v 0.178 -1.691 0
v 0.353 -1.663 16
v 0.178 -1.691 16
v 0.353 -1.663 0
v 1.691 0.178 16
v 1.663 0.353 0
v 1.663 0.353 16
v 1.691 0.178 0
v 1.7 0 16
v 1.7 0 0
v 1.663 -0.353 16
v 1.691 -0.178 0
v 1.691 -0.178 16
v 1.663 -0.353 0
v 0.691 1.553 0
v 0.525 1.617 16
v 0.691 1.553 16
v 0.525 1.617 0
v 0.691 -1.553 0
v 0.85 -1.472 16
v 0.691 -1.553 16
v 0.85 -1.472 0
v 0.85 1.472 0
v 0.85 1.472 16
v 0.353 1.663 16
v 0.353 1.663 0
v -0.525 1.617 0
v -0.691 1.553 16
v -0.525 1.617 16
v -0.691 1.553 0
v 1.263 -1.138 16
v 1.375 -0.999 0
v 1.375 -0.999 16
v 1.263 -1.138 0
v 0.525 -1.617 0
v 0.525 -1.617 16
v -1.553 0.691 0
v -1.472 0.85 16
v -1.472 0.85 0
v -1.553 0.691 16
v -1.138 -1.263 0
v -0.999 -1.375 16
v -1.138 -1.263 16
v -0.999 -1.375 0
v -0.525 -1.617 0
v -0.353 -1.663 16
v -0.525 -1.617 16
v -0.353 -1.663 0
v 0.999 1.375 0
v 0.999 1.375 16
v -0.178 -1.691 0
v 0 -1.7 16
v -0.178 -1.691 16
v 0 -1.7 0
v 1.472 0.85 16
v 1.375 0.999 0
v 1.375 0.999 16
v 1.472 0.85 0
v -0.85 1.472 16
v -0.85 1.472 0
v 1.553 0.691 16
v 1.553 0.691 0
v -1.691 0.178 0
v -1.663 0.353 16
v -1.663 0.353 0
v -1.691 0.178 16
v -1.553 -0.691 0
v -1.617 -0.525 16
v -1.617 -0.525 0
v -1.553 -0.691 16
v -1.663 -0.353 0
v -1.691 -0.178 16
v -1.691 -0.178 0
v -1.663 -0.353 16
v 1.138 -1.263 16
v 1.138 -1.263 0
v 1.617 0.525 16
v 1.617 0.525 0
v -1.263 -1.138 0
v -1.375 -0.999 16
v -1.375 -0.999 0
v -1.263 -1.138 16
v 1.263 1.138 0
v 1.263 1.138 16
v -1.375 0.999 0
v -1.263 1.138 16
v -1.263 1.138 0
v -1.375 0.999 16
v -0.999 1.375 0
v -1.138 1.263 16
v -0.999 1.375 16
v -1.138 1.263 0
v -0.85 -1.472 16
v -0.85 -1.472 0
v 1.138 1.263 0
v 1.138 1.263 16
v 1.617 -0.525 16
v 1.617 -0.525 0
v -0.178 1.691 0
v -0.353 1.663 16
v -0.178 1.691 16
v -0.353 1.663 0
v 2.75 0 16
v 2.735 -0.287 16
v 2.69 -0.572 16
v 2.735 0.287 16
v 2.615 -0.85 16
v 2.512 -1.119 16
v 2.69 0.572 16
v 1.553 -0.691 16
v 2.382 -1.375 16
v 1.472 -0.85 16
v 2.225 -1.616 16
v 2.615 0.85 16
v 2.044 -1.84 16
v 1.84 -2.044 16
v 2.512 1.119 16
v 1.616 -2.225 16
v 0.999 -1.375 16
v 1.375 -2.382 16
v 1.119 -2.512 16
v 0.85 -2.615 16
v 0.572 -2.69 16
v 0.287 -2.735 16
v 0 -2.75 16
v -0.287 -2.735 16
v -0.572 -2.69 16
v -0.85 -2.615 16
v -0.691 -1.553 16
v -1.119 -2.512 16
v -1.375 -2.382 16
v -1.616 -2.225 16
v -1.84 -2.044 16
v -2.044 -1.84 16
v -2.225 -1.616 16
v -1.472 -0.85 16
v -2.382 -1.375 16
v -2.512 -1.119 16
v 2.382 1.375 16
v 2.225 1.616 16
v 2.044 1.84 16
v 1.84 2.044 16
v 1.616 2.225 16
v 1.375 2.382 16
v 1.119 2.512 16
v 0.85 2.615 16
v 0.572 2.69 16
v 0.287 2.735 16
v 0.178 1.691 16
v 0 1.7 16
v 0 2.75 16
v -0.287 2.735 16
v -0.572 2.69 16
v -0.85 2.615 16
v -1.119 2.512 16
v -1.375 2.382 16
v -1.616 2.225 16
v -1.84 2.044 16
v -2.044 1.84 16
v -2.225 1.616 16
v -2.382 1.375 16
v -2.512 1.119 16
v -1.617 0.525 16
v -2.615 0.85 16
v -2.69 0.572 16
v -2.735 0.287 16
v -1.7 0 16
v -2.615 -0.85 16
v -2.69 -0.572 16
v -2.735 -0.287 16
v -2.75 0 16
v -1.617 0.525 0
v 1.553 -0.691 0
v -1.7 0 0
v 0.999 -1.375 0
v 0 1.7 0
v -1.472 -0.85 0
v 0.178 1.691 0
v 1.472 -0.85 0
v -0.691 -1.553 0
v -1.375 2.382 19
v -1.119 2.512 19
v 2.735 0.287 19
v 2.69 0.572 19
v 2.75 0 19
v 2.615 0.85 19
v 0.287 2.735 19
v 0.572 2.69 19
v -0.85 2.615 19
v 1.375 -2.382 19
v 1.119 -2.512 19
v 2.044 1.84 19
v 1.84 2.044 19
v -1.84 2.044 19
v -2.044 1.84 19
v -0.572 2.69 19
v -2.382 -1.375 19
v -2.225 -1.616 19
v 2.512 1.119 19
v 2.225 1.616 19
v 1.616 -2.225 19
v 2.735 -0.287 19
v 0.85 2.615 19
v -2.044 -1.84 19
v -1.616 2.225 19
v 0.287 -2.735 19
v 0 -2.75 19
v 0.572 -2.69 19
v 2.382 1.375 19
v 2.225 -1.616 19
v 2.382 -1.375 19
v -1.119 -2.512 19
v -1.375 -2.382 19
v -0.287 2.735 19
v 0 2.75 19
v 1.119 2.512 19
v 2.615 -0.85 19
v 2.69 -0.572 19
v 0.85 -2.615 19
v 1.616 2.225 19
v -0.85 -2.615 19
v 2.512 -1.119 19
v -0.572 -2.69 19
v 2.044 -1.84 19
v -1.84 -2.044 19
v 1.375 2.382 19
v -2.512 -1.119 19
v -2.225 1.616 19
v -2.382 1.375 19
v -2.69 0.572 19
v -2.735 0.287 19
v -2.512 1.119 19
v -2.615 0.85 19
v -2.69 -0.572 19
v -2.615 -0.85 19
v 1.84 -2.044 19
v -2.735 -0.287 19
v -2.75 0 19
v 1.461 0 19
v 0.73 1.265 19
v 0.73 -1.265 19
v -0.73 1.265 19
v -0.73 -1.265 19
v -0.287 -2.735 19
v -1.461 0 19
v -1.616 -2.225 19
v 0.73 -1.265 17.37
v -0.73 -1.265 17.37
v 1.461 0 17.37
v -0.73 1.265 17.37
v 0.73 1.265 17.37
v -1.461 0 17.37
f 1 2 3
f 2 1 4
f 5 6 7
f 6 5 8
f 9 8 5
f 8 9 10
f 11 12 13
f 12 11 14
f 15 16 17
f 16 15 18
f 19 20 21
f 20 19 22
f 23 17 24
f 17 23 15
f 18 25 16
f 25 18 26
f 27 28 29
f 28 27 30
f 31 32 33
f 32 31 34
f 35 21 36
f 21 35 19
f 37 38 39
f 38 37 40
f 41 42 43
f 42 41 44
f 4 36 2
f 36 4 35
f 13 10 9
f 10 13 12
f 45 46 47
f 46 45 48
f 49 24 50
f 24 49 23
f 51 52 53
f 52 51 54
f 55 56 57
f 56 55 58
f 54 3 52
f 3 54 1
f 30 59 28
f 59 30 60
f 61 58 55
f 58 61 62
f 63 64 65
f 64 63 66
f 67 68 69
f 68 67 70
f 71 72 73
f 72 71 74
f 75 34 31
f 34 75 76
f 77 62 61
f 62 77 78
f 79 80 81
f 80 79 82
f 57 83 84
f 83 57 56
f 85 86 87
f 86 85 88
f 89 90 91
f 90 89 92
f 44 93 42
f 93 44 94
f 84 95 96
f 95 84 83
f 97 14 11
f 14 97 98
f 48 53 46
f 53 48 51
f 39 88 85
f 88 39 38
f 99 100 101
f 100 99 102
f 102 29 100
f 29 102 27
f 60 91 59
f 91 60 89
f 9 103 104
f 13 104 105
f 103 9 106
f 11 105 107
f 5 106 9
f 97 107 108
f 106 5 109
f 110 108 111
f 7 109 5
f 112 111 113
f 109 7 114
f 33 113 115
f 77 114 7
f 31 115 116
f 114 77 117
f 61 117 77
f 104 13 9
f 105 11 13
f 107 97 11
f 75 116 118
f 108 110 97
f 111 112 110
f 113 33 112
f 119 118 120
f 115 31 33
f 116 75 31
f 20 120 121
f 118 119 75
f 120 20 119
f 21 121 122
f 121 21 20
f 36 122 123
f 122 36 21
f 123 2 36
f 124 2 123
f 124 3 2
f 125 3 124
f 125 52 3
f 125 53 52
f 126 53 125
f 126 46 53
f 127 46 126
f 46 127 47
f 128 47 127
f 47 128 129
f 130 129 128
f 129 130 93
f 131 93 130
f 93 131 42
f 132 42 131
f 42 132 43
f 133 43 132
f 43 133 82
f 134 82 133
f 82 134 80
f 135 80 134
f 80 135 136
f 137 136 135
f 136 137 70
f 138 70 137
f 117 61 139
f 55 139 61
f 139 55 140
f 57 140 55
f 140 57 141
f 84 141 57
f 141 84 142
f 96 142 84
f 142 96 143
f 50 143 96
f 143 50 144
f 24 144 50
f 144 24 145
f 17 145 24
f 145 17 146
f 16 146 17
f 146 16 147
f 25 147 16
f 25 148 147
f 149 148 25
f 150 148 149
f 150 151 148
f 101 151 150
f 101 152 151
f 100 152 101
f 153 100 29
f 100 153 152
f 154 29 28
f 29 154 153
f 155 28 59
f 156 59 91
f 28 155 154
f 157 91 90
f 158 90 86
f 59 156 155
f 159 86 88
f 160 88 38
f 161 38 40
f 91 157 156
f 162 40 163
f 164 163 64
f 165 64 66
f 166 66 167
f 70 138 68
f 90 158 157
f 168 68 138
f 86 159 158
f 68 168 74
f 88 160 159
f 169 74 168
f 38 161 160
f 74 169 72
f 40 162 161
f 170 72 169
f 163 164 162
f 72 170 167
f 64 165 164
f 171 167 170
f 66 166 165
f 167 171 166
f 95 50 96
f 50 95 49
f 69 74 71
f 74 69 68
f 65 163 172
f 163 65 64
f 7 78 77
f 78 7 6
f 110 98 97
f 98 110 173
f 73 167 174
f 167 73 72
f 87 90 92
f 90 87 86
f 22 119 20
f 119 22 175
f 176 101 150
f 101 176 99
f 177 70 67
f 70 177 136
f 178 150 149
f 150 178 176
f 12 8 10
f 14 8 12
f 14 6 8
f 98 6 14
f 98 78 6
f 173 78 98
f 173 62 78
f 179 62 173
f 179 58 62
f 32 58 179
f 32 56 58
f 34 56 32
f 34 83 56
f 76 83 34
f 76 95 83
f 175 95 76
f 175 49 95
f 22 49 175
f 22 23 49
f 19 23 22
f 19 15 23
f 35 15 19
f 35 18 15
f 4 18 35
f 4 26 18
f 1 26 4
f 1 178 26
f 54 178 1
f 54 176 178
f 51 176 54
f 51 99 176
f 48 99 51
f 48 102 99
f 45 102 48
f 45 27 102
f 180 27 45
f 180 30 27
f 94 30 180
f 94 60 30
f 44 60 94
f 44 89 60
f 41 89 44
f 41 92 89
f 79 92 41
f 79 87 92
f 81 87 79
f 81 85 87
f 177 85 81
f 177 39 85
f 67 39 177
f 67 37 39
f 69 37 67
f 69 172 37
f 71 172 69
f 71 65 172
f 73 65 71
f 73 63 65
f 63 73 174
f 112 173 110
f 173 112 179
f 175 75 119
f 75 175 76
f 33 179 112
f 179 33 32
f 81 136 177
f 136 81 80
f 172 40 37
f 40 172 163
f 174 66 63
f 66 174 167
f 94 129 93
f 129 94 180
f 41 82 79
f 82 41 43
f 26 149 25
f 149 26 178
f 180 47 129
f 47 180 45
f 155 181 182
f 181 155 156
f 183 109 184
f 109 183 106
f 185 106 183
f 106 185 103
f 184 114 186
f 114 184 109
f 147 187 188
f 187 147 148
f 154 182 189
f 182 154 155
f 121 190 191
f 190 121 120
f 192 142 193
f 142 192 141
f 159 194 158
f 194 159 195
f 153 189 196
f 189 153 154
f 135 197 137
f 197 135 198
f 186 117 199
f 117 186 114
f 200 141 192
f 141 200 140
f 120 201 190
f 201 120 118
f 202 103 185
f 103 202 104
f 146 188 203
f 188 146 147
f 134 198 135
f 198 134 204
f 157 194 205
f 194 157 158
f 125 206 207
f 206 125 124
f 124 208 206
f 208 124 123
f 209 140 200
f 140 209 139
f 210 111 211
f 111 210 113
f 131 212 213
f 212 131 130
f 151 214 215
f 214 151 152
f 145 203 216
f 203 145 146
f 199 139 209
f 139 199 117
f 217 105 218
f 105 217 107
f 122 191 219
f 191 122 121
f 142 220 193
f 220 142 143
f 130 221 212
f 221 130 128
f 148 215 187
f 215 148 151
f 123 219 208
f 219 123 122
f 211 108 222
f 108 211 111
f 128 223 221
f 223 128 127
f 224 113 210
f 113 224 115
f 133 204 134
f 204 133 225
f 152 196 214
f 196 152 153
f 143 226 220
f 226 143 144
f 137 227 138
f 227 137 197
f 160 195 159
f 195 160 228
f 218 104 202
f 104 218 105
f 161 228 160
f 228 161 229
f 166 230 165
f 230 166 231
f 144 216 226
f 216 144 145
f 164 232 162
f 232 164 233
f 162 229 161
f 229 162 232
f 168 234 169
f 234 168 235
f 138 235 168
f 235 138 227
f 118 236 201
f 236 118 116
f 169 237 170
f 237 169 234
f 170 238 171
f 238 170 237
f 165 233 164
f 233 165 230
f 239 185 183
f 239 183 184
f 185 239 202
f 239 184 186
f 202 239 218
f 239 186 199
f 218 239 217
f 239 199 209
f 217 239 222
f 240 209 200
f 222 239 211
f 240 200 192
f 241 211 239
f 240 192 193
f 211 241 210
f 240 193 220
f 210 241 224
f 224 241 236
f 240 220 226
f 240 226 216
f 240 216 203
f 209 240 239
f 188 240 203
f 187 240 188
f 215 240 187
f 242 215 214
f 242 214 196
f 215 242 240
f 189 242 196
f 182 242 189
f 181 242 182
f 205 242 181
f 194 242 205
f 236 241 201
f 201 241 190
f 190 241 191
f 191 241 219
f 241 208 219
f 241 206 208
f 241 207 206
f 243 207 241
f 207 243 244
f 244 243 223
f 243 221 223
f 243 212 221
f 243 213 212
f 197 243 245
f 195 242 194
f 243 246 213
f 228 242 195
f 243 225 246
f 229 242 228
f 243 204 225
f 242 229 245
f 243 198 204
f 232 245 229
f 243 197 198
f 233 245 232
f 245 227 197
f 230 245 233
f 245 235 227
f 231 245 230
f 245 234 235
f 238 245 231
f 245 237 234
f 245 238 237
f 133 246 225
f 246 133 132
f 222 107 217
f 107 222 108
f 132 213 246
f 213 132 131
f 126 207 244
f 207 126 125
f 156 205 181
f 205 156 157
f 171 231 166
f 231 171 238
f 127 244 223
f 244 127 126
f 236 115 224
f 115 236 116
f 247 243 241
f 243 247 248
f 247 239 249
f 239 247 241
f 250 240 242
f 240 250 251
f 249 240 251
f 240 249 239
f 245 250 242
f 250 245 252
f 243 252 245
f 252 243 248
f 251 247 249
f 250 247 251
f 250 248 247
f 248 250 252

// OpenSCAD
// Socket-head cap screw, smooth printable representation.
$fn = 60;
eps = 0.02;
shaft_d = 3.4;
head_d = 5.5;
head_h = 3;
shaft_l = 16;
socket_flat = head_d * 0.46;
socket_depth = head_h * 0.55;
difference() {
    union() {
        cylinder(d = shaft_d, h = shaft_l);
        translate([0, 0, shaft_l]) cylinder(d = head_d, h = head_h);
    }
    translate([0, 0, shaft_l + head_h - socket_depth + eps])
        cylinder(d = socket_flat / cos(30), h = socket_depth + eps, $fn = 6);
}
